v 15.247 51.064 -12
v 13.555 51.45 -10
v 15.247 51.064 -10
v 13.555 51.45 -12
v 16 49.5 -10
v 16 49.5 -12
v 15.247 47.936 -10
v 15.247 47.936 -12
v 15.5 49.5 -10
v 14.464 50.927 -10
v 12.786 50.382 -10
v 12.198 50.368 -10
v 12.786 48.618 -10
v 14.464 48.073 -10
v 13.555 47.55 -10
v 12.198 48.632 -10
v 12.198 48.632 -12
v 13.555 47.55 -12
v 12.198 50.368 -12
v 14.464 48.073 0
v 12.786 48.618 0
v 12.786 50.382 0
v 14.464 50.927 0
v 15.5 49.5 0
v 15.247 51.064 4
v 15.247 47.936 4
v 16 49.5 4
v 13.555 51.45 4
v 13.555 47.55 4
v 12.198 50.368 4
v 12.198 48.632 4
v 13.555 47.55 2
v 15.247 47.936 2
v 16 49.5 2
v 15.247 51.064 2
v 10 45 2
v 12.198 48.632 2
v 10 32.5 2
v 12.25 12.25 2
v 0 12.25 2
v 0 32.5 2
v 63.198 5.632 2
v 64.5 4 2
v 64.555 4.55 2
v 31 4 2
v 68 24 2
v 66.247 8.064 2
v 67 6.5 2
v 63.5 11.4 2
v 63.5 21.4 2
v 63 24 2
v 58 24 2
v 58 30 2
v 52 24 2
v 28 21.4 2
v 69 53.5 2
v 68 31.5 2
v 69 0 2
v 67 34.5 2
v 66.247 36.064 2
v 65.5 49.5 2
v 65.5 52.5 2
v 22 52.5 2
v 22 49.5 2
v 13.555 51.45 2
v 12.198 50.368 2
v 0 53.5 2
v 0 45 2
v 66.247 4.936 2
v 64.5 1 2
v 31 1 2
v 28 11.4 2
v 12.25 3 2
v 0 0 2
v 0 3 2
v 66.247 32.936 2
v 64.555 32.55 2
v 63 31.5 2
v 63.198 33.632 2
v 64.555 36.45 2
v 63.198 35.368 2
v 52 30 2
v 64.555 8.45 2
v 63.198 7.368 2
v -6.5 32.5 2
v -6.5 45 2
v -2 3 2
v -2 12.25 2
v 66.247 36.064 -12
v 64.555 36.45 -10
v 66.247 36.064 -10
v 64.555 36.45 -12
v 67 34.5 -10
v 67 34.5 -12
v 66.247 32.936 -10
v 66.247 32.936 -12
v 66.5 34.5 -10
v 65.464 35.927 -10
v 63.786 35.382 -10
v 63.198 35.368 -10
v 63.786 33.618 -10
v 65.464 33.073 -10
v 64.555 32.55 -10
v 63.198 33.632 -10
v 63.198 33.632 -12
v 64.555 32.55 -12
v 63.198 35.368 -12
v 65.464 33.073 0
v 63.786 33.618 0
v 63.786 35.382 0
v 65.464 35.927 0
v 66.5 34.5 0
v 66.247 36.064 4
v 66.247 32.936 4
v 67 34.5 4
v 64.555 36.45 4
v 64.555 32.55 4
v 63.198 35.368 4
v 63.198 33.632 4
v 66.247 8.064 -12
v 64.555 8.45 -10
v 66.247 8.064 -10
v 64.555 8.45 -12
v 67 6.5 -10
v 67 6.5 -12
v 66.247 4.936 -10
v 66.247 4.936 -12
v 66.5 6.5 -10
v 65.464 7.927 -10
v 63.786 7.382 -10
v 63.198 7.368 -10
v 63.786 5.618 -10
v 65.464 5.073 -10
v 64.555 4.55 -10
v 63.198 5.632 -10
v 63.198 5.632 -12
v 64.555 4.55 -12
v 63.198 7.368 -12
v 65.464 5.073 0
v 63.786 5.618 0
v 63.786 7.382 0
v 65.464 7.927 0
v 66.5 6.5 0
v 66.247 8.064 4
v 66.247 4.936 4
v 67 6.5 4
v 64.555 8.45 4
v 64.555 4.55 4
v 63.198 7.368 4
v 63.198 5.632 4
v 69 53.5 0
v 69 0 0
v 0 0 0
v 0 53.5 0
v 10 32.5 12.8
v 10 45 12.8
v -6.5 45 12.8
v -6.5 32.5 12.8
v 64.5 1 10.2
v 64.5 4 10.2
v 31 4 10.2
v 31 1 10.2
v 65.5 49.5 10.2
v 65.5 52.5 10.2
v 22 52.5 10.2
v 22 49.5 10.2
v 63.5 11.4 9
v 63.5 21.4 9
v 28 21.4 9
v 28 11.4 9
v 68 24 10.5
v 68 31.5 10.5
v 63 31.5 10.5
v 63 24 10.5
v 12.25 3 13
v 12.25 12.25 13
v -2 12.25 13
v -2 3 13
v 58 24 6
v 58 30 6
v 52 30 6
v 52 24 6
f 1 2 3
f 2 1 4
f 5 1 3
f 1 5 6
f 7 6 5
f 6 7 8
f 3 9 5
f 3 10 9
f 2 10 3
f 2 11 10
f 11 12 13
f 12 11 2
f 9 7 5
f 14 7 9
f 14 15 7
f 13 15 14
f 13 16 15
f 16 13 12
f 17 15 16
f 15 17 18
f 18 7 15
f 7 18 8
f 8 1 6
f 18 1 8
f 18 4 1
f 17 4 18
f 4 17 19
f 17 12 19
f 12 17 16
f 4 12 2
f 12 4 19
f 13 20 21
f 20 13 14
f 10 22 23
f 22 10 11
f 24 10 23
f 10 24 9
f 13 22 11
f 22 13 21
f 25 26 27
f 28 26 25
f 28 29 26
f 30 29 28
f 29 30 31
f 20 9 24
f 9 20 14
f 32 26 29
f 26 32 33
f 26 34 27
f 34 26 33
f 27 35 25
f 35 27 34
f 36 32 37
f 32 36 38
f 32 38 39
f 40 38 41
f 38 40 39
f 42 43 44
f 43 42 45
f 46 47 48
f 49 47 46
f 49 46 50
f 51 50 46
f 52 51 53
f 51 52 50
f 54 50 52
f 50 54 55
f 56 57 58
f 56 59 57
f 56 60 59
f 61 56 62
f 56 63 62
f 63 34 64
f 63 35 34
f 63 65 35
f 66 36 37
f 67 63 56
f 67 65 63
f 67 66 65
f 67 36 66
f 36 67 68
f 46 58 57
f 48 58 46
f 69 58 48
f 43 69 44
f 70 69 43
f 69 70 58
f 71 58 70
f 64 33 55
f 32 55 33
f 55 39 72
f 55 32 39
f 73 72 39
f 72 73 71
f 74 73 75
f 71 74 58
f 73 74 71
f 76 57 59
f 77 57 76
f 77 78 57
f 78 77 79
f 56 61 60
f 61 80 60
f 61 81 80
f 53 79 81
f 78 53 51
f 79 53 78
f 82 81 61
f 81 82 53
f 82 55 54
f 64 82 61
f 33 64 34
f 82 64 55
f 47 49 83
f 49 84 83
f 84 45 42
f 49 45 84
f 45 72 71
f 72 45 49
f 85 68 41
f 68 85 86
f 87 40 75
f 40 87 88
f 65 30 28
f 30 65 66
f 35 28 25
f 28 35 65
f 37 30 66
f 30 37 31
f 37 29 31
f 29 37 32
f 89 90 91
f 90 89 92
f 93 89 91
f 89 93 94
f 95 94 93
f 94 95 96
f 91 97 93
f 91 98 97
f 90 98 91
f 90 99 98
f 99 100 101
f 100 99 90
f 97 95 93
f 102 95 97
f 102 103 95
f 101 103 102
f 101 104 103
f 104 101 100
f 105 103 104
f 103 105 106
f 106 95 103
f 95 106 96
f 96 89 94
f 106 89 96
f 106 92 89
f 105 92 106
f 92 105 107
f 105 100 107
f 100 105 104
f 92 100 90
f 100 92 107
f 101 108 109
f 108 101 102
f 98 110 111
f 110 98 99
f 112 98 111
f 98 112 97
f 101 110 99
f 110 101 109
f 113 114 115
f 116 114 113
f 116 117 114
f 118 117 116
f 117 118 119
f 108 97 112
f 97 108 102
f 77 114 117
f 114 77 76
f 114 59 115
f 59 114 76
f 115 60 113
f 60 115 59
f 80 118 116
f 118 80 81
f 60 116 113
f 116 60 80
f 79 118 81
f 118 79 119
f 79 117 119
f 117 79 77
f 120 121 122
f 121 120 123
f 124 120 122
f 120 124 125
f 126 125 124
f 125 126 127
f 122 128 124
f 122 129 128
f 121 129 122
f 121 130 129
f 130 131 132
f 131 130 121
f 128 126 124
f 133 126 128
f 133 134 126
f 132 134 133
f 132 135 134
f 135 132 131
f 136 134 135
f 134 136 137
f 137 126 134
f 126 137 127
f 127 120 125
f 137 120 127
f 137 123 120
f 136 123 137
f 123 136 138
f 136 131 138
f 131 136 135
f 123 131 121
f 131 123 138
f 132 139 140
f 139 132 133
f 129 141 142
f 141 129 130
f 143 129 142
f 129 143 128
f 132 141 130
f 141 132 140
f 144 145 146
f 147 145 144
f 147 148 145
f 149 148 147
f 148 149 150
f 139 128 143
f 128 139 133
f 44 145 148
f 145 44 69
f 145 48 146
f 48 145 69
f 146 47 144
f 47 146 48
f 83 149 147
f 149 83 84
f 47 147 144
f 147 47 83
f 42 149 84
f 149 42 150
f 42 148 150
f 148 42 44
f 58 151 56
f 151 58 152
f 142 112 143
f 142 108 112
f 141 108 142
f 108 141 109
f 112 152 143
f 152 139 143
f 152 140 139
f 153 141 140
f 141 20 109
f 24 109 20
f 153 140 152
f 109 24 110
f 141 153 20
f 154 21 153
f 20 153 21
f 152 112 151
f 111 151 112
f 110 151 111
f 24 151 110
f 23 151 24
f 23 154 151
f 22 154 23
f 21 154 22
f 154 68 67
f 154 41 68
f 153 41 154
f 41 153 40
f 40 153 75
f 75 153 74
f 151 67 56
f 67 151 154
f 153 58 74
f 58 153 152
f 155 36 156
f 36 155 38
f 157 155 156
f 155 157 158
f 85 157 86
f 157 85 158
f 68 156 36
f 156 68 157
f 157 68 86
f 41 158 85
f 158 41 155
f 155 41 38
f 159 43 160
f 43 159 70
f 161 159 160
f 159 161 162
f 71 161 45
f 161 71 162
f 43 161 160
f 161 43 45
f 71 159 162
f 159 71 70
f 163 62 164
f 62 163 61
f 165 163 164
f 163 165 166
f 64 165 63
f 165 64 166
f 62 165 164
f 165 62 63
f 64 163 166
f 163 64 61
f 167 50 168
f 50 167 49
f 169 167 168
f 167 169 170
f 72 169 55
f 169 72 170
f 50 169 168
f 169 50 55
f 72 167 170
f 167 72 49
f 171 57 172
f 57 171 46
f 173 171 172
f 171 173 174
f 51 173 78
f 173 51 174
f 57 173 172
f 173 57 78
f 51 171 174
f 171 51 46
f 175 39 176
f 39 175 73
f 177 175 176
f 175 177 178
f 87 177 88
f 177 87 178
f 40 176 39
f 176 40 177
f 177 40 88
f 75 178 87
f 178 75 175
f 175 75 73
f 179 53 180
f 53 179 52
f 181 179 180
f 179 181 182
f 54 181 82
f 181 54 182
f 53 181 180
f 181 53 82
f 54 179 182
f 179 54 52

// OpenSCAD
// file: hardware.scad
axle_r = 4.5;
axle_separation = 30;

module axle(h) {
	rotate(v=[-1,0,0], a=90) cylinder(r=axle_r, h=h, $fn=10);
}

module axlepair(h=100) {
	union() {
		axle(h);
		translate(v=[axle_separation, 0, 0]) axle(h);
	}
}

module m2(h=16) {
	union() {
		cylinder(r=2, h=2);
		cylinder(r=1.5, h=h);
	}
}

module m3(h=16) {
	union() {
		cylinder(r=3.25, h=3);
		cylinder(r=2, h=h);
	}
}

module m5(h=16) {
	union() {
		cylinder(r=4.5, h=5);
		cylinder(r=3, h=h);
	}
}
// main file
use <hardware.scad>

module arduino(with_screws=0) {
	module screws() {
		module screw(h=16) {
				union() {
						m2(h);
						translate(v=[0,0,h]) rotate(v=[1,0,0],a=180) m2(h);
				}
		}
		translate(v=[14,49.5,-12]) screw();
		translate(v=[65,34.5,-12]) screw();
		translate(v=[65,6.5,-12]) screw();
	}

	difference() {	
		union() {
			color([0,0.4,0.6,1]) cube([69,53.5,2]);

			// USB Port
			color([0.8,0.8,0.8]) translate(v=[-6.5,32.5,2]) cube([16.5,12.5,10.8]);

			// Power / Analog headers
			color([0,0,0]) translate(v=[31,1,0]) cube([33.5, 3, 10.2]);

			// Digital IO headers
			color([0,0,0]) translate(v=[22,49.5,0]) cube([43.5, 3, 10.2]);

			// IC and socket
			color([0,0,0]) translate(v=[28,11.4,0]) cube([35.5,10,9]);

			// ICSP header
			color([0,0,0]) translate(v=[63,24,0]) cube([5,7.5,10.5]);

			// DC barrel jack
			color([0,0,0]) translate(v=[-2,3,2]) cube([14.25,9.25,11]);

			// Reset button
			color([0.9,0.9,0.9]) translate(v=[52,24,0]) cube(6);

			if (with_screws == 1) screws();
		}

		if (with_screws == 0) screws();
	}
}

arduino(1);
